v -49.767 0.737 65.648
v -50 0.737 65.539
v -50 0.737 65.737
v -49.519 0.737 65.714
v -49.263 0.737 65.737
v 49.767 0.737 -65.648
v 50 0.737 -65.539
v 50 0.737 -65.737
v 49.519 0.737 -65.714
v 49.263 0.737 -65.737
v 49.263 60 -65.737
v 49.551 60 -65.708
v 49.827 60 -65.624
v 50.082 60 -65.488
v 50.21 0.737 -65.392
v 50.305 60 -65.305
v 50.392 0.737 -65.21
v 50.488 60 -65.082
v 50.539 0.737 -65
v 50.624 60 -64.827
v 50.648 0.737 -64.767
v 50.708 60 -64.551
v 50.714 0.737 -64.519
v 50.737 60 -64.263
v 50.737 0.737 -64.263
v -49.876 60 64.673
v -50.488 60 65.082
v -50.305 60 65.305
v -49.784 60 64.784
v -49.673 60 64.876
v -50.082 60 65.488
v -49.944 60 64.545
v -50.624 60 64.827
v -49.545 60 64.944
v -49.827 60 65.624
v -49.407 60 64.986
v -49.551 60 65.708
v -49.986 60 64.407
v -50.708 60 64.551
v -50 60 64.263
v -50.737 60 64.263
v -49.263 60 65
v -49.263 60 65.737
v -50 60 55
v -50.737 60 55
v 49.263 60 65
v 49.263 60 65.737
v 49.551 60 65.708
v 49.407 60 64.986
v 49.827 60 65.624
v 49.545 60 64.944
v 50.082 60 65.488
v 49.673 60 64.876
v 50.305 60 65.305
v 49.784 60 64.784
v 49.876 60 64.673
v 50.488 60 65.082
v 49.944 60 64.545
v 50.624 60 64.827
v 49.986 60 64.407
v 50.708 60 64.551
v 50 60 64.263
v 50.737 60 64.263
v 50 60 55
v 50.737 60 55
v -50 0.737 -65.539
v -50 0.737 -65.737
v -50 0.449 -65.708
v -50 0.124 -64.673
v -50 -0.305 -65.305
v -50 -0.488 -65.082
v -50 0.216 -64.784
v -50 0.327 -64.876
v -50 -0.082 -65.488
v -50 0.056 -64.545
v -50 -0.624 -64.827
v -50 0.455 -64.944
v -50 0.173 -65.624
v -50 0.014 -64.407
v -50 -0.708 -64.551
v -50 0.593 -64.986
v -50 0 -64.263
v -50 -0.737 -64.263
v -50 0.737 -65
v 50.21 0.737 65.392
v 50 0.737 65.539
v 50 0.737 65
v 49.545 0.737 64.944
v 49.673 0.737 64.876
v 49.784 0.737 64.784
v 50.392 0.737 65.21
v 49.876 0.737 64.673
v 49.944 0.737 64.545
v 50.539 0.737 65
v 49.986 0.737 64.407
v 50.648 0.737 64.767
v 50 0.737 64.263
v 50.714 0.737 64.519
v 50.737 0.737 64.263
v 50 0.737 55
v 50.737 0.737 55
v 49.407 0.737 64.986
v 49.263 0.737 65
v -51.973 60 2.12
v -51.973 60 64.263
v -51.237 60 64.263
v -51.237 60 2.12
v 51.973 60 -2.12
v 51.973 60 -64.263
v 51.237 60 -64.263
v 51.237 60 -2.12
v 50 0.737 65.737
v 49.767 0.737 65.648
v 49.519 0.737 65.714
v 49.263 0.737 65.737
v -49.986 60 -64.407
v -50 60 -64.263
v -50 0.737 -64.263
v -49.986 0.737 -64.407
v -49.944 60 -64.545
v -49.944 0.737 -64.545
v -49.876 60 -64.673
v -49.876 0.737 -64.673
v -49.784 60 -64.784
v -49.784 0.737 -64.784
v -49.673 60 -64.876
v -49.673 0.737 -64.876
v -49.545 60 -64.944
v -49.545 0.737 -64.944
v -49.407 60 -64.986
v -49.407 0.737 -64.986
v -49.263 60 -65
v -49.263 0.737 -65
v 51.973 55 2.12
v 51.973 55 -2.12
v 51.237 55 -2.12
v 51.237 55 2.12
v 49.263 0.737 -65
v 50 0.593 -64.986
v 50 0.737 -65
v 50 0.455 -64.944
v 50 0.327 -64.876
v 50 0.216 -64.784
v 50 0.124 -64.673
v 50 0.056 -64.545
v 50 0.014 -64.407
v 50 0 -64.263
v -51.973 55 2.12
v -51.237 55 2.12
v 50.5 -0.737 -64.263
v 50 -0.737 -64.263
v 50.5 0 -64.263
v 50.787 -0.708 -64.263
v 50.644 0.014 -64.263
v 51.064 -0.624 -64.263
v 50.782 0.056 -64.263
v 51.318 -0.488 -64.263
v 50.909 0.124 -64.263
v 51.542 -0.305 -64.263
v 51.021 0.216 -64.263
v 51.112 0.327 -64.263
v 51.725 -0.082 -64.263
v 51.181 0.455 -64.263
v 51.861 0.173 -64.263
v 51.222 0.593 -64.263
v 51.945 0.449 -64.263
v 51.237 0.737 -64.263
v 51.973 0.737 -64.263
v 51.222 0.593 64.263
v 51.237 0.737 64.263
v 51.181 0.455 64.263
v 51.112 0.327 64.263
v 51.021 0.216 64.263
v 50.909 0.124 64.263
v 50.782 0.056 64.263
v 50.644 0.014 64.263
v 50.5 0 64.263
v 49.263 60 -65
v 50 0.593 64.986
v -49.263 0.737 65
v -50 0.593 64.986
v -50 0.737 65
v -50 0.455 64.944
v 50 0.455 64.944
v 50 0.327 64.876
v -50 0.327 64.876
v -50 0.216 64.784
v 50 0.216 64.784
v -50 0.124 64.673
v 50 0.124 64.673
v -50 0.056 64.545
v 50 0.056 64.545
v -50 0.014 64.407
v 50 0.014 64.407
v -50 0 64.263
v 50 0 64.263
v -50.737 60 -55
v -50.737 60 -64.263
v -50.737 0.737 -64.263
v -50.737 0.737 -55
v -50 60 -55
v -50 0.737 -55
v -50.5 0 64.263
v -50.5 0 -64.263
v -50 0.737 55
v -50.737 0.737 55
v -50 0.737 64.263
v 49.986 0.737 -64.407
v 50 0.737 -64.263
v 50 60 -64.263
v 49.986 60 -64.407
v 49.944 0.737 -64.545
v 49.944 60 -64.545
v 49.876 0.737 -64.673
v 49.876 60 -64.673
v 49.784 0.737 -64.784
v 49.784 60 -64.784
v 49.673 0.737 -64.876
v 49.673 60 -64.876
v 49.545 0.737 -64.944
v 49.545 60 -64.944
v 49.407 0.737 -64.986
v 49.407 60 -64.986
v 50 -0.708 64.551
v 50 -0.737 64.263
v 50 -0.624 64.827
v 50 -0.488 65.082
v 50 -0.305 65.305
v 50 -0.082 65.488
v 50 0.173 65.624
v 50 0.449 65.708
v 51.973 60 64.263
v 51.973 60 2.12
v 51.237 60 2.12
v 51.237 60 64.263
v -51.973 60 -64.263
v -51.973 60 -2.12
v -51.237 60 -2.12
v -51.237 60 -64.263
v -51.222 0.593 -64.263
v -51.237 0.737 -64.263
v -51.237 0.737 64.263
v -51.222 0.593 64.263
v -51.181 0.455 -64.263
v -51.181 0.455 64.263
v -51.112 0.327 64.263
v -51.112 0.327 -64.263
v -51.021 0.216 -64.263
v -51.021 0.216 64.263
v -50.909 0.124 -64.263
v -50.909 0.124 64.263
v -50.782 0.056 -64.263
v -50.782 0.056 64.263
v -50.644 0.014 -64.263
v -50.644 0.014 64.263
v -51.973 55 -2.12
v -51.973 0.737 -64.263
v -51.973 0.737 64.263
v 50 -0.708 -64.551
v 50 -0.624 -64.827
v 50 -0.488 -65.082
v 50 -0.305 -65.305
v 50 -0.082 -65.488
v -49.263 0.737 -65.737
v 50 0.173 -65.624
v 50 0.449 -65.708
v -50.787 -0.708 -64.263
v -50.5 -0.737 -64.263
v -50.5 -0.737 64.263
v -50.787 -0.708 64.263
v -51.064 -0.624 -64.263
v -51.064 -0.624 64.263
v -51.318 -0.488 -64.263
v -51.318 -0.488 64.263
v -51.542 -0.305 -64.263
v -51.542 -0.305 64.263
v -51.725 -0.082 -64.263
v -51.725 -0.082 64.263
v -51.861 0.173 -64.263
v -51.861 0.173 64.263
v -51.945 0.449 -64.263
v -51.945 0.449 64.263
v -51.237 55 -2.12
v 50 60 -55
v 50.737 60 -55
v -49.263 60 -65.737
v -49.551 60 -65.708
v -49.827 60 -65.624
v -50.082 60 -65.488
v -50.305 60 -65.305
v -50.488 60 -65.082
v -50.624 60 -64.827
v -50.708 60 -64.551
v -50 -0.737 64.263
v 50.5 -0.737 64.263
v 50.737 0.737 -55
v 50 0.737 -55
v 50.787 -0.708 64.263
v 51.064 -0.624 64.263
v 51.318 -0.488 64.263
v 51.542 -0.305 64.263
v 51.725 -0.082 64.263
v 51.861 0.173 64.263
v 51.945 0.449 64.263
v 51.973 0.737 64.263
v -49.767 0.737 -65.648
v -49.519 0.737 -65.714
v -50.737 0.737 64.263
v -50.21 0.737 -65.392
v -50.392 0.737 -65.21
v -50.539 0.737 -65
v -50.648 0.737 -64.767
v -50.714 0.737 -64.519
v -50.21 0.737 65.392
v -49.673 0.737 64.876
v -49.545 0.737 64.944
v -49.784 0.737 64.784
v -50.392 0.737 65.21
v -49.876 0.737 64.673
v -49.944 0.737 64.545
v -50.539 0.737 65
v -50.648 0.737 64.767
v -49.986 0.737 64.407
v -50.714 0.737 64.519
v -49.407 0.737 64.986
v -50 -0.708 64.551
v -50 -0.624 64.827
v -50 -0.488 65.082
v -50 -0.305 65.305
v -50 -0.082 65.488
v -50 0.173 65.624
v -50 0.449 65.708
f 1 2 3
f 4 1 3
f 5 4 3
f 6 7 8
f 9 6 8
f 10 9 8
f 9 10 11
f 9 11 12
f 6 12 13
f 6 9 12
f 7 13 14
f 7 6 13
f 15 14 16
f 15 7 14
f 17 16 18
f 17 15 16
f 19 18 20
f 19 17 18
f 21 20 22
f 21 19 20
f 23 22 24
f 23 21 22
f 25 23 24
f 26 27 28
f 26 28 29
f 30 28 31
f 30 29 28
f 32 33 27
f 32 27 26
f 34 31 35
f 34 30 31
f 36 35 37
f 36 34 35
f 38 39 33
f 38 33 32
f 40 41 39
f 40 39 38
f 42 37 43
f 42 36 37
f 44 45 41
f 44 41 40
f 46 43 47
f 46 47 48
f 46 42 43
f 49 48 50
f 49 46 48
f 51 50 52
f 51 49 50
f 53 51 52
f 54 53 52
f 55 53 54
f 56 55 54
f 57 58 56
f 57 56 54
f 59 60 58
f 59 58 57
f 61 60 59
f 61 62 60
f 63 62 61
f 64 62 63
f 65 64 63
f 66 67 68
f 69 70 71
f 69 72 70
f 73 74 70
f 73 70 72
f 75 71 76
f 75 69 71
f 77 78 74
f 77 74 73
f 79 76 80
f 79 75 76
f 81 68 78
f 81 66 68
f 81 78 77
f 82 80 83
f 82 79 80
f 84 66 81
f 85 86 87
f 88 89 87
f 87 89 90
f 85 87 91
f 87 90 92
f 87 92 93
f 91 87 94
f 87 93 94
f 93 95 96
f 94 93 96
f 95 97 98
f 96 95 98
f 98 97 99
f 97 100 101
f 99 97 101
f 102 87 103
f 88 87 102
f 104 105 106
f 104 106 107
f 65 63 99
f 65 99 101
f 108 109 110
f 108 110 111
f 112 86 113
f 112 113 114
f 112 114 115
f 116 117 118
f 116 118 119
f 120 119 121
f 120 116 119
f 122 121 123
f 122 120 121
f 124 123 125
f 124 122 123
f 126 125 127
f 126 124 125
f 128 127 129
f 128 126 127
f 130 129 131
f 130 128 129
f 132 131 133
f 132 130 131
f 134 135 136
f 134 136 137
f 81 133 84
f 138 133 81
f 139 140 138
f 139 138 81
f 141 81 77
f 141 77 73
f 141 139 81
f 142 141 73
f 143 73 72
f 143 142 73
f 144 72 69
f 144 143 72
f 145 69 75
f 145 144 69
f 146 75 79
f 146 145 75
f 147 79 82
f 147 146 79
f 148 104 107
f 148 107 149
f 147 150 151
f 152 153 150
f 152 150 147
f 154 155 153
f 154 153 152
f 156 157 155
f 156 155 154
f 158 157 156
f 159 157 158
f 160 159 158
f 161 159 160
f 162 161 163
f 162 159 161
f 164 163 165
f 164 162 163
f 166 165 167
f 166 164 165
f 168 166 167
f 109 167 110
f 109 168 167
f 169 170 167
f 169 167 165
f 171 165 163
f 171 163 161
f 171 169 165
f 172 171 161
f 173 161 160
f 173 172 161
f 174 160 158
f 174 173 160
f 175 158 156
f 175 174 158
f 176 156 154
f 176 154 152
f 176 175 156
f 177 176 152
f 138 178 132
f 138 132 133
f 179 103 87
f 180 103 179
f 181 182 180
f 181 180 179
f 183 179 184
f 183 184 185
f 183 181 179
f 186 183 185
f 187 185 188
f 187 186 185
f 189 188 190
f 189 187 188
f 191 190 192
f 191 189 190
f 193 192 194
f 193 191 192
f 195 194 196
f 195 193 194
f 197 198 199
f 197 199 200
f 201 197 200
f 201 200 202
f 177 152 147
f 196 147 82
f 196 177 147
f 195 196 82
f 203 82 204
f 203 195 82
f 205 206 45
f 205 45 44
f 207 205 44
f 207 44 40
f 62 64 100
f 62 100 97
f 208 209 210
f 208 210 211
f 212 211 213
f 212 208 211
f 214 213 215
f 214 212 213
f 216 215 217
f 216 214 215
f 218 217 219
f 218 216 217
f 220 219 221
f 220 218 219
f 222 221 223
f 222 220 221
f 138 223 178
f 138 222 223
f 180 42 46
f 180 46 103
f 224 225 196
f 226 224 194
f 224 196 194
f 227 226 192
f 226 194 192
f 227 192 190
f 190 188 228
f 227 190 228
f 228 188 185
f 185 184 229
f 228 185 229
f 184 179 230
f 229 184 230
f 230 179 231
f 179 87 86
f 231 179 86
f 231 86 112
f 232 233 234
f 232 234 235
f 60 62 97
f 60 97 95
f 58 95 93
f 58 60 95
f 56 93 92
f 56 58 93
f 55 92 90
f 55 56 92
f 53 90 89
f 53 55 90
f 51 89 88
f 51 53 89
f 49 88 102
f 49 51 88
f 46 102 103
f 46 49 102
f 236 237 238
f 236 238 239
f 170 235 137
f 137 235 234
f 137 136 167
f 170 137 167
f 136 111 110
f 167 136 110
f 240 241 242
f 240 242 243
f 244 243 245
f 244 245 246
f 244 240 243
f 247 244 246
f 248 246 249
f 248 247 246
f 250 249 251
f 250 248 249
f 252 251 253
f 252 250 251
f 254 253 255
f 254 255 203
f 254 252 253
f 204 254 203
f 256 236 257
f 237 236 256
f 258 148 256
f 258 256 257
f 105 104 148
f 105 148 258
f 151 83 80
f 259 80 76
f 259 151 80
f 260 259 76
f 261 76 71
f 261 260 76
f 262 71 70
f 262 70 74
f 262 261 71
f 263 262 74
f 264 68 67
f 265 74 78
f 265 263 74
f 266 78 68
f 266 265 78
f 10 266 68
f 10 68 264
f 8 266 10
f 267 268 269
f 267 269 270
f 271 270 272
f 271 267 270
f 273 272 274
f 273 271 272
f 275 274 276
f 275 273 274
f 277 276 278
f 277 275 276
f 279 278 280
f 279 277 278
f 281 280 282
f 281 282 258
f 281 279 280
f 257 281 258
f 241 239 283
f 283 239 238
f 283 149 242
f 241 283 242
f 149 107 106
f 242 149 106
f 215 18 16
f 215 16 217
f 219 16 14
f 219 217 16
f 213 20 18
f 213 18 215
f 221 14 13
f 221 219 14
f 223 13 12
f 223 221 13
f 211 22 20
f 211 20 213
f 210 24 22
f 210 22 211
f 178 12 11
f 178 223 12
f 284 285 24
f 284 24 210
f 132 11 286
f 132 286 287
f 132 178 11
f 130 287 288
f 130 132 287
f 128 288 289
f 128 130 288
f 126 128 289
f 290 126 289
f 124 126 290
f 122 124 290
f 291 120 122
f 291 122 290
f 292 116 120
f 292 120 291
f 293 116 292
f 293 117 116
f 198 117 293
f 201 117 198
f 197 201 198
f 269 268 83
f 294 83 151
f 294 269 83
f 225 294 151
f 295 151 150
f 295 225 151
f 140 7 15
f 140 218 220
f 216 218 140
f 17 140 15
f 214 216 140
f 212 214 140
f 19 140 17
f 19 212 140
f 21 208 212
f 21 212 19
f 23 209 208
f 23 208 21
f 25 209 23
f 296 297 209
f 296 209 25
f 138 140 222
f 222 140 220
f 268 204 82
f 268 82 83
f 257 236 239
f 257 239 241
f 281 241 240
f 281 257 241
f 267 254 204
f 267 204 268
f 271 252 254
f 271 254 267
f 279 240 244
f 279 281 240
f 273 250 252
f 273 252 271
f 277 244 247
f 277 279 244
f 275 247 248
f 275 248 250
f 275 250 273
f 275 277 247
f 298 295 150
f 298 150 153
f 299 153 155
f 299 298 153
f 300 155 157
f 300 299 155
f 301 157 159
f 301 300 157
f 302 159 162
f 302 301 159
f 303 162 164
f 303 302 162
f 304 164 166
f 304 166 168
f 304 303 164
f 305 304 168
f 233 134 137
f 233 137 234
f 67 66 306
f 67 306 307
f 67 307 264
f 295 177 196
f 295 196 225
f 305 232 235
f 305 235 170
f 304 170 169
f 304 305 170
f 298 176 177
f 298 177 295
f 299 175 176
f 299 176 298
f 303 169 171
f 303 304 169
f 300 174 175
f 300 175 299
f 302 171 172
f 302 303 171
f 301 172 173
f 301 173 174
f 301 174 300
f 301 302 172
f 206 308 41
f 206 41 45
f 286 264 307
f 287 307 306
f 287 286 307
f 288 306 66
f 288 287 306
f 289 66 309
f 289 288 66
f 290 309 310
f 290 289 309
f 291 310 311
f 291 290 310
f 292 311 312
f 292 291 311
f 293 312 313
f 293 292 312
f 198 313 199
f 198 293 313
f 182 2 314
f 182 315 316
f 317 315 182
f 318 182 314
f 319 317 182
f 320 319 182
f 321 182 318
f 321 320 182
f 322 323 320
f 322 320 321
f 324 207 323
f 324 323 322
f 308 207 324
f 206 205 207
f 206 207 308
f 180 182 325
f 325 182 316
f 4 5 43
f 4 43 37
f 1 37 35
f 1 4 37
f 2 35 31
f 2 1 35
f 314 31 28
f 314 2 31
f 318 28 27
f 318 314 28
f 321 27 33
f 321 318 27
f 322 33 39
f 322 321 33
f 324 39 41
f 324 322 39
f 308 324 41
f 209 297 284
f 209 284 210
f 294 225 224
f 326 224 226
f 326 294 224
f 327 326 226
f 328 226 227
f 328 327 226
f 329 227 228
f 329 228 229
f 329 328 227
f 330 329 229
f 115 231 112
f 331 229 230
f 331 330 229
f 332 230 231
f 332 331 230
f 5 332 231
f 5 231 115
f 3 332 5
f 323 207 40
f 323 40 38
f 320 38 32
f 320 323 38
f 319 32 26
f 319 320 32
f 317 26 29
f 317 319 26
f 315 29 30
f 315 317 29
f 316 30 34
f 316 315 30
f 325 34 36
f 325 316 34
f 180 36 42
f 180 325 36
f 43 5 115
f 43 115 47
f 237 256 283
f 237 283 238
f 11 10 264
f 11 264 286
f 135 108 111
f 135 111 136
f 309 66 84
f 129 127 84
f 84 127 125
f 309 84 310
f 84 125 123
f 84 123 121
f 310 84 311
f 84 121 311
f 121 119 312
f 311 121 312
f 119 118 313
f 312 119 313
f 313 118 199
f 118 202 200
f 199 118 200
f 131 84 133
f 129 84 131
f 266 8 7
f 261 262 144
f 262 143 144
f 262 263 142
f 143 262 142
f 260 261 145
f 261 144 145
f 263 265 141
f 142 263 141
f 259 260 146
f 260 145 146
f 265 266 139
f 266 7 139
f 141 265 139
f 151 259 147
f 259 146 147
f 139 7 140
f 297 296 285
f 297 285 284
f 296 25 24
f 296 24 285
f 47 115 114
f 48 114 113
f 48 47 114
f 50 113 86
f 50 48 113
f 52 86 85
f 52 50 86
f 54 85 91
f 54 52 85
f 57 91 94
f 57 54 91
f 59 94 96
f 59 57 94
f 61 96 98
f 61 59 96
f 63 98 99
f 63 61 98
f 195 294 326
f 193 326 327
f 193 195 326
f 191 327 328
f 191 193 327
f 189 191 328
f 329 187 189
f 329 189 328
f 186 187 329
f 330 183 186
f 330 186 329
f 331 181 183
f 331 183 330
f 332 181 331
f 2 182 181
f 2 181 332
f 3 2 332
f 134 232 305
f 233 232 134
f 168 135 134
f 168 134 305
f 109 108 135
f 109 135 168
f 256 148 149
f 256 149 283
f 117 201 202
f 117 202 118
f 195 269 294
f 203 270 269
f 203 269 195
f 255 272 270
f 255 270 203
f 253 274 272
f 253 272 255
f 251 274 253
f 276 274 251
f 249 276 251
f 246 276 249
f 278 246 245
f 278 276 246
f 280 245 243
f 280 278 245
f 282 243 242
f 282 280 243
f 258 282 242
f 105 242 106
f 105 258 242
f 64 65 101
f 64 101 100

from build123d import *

# Parameters (mm, degrees)
SKETCH1_W                        = 100
SKETCH1_H                        = 130
BASE_FLANGE1_DEPTH               = 0.7366
BOX_REAR_STRIP_W                 = 4.4196
BOX_REAR_STRIP_H                 = 0.7366
BOX_REAR_STRIP_CUT_DEPTH         = 100
BOX_REAR_DEPTH                   = 100
BOX_FRONT_STRIP_W                = 4.4196
BOX_FRONT_STRIP_H                = 0.7366
BOX_FRONT_STRIP_CUT_DEPTH        = 100
BOX_FRONT_DEPTH                  = 100
BOX_FRONT_TABS_STRIP_W           = 4.4196
BOX_FRONT_TABS_STRIP_H           = 0.7366
BOX_FRONT_TABS_STRIP_CUT_DEPTH   = 59.2634
BOX_FRONT_TABS_STRIP_2_W         = 4.4196
BOX_FRONT_TABS_STRIP_2_H         = 0.7366
BOX_FRONT_TABS_STRIP_CUT_2_DEPTH = 59.2634
BOX_FRONT_TABS_DEPTH             = 59.2634
BOX_FRONT_TABS_BEND_DEPTH        = 59.2634
BOX_REAR_TABS_STRIP_W            = 4.4196
BOX_REAR_TABS_STRIP_H            = 0.7366
BOX_REAR_TABS_STRIP_CUT_DEPTH    = 59.2634
BOX_REAR_TABS_STRIP_2_W          = 4.4196
BOX_REAR_TABS_STRIP_2_H          = 0.7366
BOX_REAR_TABS_STRIP_CUT_2_DEPTH  = 59.2634
BOX_REAR_TABS_DEPTH              = 59.2634
BOX_REAR_TABS_BEND_DEPTH         = 59.2634
EDGE_FLANGE6_DEPTH               = 128.5268
EDGE_FLANGE6_START               = 0.7366
EDGE_FLANGE6_FLAT_DEPTH          = 0.7366
EDGE_FLANGE6_BEND_DEPTH          = 128.5268
EDGE_FLANGE6_FLAT_2_DEPTH        = 0.7366


# Sheet-metal steps are written as plain solids
with BuildPart() as part:
    # Sketch1 → Base-Flange1 (new body)
    with BuildSketch(Plane(origin=(0, 0, 0), x_dir=(1, 0, 0), z_dir=(0, 1, 0))):
        Rectangle(SKETCH1_W, SKETCH1_H)
    extrude(amount=-BASE_FLANGE1_DEPTH)

    # Box rear strip (across the edge) → Box rear strip cut (cut)
    with BuildSketch(Plane(origin=(50, 0, -65), x_dir=(0, 0, 1), z_dir=(-1, 0, 0))):
        with Locations((-1.4732, -0.3683)):
            Rectangle(BOX_REAR_STRIP_W, BOX_REAR_STRIP_H)
    extrude(amount=BOX_REAR_STRIP_CUT_DEPTH, mode=Mode.SUBTRACT)

    # Box rear section (across the edge) → Box rear (add)
    with BuildSketch(Plane(origin=(50, 0, -65), x_dir=(0, 0, 1), z_dir=(-1, 0, 0))):
        with BuildLine():
            Line((-0.7366, 0.7366), (-0.7366, 60))
            Line((-0.7366, 60), (0, 60))
            Line((0, 60), (0, 0.7366))
            ThreePointArc((0, 0.7366), (0.215745145, 0.215745145), (0.7366, 0))
            Line((0.7366, 0), (0.7366, -0.7366))
            ThreePointArc((0.7366, -0.7366), (-0.30510971, -0.30510971), (-0.7366, 0.7366))
        make_face()
    extrude(amount=BOX_REAR_DEPTH)

    # Box front strip (across the edge) → Box front strip cut (cut)
    with BuildSketch(Plane(origin=(-50, 0, 65), x_dir=(0, 0, -1), z_dir=(1, 0, 0))):
        with Locations((-1.4732, -0.3683)):
            Rectangle(BOX_FRONT_STRIP_W, BOX_FRONT_STRIP_H)
    extrude(amount=BOX_FRONT_STRIP_CUT_DEPTH, mode=Mode.SUBTRACT)

    # Box front section (across the edge) → Box front (add)
    with BuildSketch(Plane(origin=(-50, 0, 65), x_dir=(0, 0, -1), z_dir=(1, 0, 0))):
        with BuildLine():
            Line((-0.7366, 0.7366), (-0.7366, 60))
            Line((-0.7366, 60), (0, 60))
            Line((0, 60), (0, 0.7366))
            ThreePointArc((0, 0.7366), (0.215745145, 0.215745145), (0.7366, 0))
            Line((0.7366, 0), (0.7366, -0.7366))
            ThreePointArc((0.7366, -0.7366), (-0.30510971, -0.30510971), (-0.7366, 0.7366))
        make_face()
    extrude(amount=BOX_FRONT_DEPTH)

    # Box-front tabs strip (across the edge) → Box-front tabs strip cut (cut)
    with BuildSketch(Plane(origin=(-50, 0.7366, 65), x_dir=(1, 0, 0), z_dir=(0, 1, 0))):
        with Locations((-1.4732, -0.3683)):
            Rectangle(BOX_FRONT_TABS_STRIP_W, BOX_FRONT_TABS_STRIP_H)
    extrude(amount=BOX_FRONT_TABS_STRIP_CUT_DEPTH, mode=Mode.SUBTRACT)

    # Box-front tabs strip 2 (across the edge) → Box-front tabs strip cut 2 (cut)
    with BuildSketch(Plane(origin=(50, 60, 65), x_dir=(-1, 0, 0), z_dir=(0, -1, 0))):
        with Locations((-1.4732, -0.3683)):
            Rectangle(BOX_FRONT_TABS_STRIP_2_W, BOX_FRONT_TABS_STRIP_2_H)
    extrude(amount=BOX_FRONT_TABS_STRIP_CUT_2_DEPTH, mode=Mode.SUBTRACT)

    # Box-front tabs section (across the edge) → Box-front tabs (add)
    with BuildSketch(Plane(origin=(-50, 0.7366, 65), x_dir=(1, 0, 0), z_dir=(0, 1, 0))):
        with BuildLine():
            Line((-0.7366, 0.7366), (-0.7366, 10))
            Line((-0.7366, 10), (0, 10))
            Line((0, 10), (0, 0.7366))
            ThreePointArc((0, 0.7366), (0.215745145, 0.215745145), (0.7366, 0))
            Line((0.7366, 0), (0.7366, -0.7366))
            ThreePointArc((0.7366, -0.7366), (-0.30510971, -0.30510971), (-0.7366, 0.7366))
        make_face()
    extrude(amount=BOX_FRONT_TABS_DEPTH)

    # Box-front tabs section 2 (across the edge) → Box-front tabs bend (add)
    with BuildSketch(Plane(origin=(50, 60, 65), x_dir=(-1, 0, 0), z_dir=(0, -1, 0))):
        with BuildLine():
            Line((-0.7366, 0.7366), (-0.7366, 10))
            Line((-0.7366, 10), (0, 10))
            Line((0, 10), (0, 0.7366))
            ThreePointArc((0, 0.7366), (0.215745145, 0.215745145), (0.7366, 0))
            Line((0.7366, 0), (0.7366, -0.7366))
            ThreePointArc((0.7366, -0.7366), (-0.30510971, -0.30510971), (-0.7366, 0.7366))
        make_face()
    extrude(amount=BOX_FRONT_TABS_BEND_DEPTH)

    # Box-rear tabs strip (across the edge) → Box-rear tabs strip cut (cut)
    with BuildSketch(Plane(origin=(50, 0.7366, -65), x_dir=(-1, 0, 0), z_dir=(0, 1, 0))):
        with Locations((-1.4732, -0.3683)):
            Rectangle(BOX_REAR_TABS_STRIP_W, BOX_REAR_TABS_STRIP_H)
    extrude(amount=BOX_REAR_TABS_STRIP_CUT_DEPTH, mode=Mode.SUBTRACT)

    # Box-rear tabs strip 2 (across the edge) → Box-rear tabs strip cut 2 (cut)
    with BuildSketch(Plane(origin=(-50, 60, -65), x_dir=(1, 0, 0), z_dir=(0, -1, 0))):
        with Locations((-1.4732, -0.3683)):
            Rectangle(BOX_REAR_TABS_STRIP_2_W, BOX_REAR_TABS_STRIP_2_H)
    extrude(amount=BOX_REAR_TABS_STRIP_CUT_2_DEPTH, mode=Mode.SUBTRACT)

    # Box-rear tabs section (across the edge) → Box-rear tabs (add)
    with BuildSketch(Plane(origin=(50, 0.7366, -65), x_dir=(-1, 0, 0), z_dir=(0, 1, 0))):
        with BuildLine():
            Line((-0.7366, 0.7366), (-0.7366, 10))
            Line((-0.7366, 10), (0, 10))
            Line((0, 10), (0, 0.7366))
            ThreePointArc((0, 0.7366), (0.215745145, 0.215745145), (0.7366, 0))
            Line((0.7366, 0), (0.7366, -0.7366))
            ThreePointArc((0.7366, -0.7366), (-0.30510971, -0.30510971), (-0.7366, 0.7366))
        make_face()
    extrude(amount=BOX_REAR_TABS_DEPTH)

    # Box-rear tabs section 2 (across the edge) → Box-rear tabs bend (add)
    with BuildSketch(Plane(origin=(-50, 60, -65), x_dir=(1, 0, 0), z_dir=(0, -1, 0))):
        with BuildLine():
            Line((-0.7366, 0.7366), (-0.7366, 10))
            Line((-0.7366, 10), (0, 10))
            Line((0, 10), (0, 0.7366))
            ThreePointArc((0, 0.7366), (0.215745145, 0.215745145), (0.7366, 0))
            Line((0.7366, 0), (0.7366, -0.7366))
            ThreePointArc((0.7366, -0.7366), (-0.30510971, -0.30510971), (-0.7366, 0.7366))
        make_face()
    extrude(amount=BOX_REAR_TABS_BEND_DEPTH)

    # Edge-Flange6 bend section (across the edge) → Edge-Flange6 (add)
    with BuildSketch(Plane(origin=(-51.2366, 0, -64.2634), x_dir=(1, 0, 0), z_dir=(0, 0, 1))):
        with BuildLine():
            Line((-0.7366, 0.7366), (0, 0.7366))
            ThreePointArc((0, 0.7366), (0.215745145, 0.215745145), (0.7366, 0))
            Line((0.7366, 0), (1.2366, 0))
            Line((1.2366, 0), (1.2366, -0.7366))
            Line((1.2366, -0.7366), (0.7366, -0.7366))
            ThreePointArc((0.7366, -0.7366), (-0.30510971, -0.30510971), (-0.7366, 0.7366))
        make_face()
    extrude(amount=EDGE_FLANGE6_DEPTH)

    # Edge-Flange6 profile (on flange) → Edge-Flange6 flat (add)
    with BuildSketch(Plane.ZY.offset(51.2366).offset(EDGE_FLANGE6_START)):
        Polygon((-64.2634, 60), (-64.2634, 0.7366), (64.2634, 0.7366), (64.2634, 60), (2.12, 60), (2.12, 55), (-2.12, 55), (-2.12, 60), align=None)
    extrude(amount=-EDGE_FLANGE6_FLAT_DEPTH)

    # Edge-Flange6 bend section 2 (across the edge) → Edge-Flange6 bend (add)
    with BuildSketch(Plane(origin=(51.2366, 0, 64.2634), x_dir=(-1, 0, 0), z_dir=(0, 0, -1))):
        with BuildLine():
            Line((-0.7366, 0.7366), (0, 0.7366))
            ThreePointArc((0, 0.7366), (0.215745145, 0.215745145), (0.7366, 0))
            Line((0.7366, 0), (1.2366, 0))
            Line((1.2366, 0), (1.2366, -0.7366))
            Line((1.2366, -0.7366), (0.7366, -0.7366))
            ThreePointArc((0.7366, -0.7366), (-0.30510971, -0.30510971), (-0.7366, 0.7366))
        make_face()
    extrude(amount=EDGE_FLANGE6_BEND_DEPTH)

    # Edge-Flange6 profile 2 (on flange) → Edge-Flange6 flat 2 (add)
    with BuildSketch(Plane(origin=(51.2366, 0, 0), x_dir=(0, 0, -1), z_dir=(1, 0, 0)).offset(EDGE_FLANGE6_START)):
        Polygon((-64.2634, 60), (-64.2634, 0.7366), (64.2634, 0.7366), (64.2634, 60), (2.12, 60), (2.12, 55), (-2.12, 55), (-2.12, 60), align=None)
    extrude(amount=-EDGE_FLANGE6_FLAT_2_DEPTH)


solid = part.part
